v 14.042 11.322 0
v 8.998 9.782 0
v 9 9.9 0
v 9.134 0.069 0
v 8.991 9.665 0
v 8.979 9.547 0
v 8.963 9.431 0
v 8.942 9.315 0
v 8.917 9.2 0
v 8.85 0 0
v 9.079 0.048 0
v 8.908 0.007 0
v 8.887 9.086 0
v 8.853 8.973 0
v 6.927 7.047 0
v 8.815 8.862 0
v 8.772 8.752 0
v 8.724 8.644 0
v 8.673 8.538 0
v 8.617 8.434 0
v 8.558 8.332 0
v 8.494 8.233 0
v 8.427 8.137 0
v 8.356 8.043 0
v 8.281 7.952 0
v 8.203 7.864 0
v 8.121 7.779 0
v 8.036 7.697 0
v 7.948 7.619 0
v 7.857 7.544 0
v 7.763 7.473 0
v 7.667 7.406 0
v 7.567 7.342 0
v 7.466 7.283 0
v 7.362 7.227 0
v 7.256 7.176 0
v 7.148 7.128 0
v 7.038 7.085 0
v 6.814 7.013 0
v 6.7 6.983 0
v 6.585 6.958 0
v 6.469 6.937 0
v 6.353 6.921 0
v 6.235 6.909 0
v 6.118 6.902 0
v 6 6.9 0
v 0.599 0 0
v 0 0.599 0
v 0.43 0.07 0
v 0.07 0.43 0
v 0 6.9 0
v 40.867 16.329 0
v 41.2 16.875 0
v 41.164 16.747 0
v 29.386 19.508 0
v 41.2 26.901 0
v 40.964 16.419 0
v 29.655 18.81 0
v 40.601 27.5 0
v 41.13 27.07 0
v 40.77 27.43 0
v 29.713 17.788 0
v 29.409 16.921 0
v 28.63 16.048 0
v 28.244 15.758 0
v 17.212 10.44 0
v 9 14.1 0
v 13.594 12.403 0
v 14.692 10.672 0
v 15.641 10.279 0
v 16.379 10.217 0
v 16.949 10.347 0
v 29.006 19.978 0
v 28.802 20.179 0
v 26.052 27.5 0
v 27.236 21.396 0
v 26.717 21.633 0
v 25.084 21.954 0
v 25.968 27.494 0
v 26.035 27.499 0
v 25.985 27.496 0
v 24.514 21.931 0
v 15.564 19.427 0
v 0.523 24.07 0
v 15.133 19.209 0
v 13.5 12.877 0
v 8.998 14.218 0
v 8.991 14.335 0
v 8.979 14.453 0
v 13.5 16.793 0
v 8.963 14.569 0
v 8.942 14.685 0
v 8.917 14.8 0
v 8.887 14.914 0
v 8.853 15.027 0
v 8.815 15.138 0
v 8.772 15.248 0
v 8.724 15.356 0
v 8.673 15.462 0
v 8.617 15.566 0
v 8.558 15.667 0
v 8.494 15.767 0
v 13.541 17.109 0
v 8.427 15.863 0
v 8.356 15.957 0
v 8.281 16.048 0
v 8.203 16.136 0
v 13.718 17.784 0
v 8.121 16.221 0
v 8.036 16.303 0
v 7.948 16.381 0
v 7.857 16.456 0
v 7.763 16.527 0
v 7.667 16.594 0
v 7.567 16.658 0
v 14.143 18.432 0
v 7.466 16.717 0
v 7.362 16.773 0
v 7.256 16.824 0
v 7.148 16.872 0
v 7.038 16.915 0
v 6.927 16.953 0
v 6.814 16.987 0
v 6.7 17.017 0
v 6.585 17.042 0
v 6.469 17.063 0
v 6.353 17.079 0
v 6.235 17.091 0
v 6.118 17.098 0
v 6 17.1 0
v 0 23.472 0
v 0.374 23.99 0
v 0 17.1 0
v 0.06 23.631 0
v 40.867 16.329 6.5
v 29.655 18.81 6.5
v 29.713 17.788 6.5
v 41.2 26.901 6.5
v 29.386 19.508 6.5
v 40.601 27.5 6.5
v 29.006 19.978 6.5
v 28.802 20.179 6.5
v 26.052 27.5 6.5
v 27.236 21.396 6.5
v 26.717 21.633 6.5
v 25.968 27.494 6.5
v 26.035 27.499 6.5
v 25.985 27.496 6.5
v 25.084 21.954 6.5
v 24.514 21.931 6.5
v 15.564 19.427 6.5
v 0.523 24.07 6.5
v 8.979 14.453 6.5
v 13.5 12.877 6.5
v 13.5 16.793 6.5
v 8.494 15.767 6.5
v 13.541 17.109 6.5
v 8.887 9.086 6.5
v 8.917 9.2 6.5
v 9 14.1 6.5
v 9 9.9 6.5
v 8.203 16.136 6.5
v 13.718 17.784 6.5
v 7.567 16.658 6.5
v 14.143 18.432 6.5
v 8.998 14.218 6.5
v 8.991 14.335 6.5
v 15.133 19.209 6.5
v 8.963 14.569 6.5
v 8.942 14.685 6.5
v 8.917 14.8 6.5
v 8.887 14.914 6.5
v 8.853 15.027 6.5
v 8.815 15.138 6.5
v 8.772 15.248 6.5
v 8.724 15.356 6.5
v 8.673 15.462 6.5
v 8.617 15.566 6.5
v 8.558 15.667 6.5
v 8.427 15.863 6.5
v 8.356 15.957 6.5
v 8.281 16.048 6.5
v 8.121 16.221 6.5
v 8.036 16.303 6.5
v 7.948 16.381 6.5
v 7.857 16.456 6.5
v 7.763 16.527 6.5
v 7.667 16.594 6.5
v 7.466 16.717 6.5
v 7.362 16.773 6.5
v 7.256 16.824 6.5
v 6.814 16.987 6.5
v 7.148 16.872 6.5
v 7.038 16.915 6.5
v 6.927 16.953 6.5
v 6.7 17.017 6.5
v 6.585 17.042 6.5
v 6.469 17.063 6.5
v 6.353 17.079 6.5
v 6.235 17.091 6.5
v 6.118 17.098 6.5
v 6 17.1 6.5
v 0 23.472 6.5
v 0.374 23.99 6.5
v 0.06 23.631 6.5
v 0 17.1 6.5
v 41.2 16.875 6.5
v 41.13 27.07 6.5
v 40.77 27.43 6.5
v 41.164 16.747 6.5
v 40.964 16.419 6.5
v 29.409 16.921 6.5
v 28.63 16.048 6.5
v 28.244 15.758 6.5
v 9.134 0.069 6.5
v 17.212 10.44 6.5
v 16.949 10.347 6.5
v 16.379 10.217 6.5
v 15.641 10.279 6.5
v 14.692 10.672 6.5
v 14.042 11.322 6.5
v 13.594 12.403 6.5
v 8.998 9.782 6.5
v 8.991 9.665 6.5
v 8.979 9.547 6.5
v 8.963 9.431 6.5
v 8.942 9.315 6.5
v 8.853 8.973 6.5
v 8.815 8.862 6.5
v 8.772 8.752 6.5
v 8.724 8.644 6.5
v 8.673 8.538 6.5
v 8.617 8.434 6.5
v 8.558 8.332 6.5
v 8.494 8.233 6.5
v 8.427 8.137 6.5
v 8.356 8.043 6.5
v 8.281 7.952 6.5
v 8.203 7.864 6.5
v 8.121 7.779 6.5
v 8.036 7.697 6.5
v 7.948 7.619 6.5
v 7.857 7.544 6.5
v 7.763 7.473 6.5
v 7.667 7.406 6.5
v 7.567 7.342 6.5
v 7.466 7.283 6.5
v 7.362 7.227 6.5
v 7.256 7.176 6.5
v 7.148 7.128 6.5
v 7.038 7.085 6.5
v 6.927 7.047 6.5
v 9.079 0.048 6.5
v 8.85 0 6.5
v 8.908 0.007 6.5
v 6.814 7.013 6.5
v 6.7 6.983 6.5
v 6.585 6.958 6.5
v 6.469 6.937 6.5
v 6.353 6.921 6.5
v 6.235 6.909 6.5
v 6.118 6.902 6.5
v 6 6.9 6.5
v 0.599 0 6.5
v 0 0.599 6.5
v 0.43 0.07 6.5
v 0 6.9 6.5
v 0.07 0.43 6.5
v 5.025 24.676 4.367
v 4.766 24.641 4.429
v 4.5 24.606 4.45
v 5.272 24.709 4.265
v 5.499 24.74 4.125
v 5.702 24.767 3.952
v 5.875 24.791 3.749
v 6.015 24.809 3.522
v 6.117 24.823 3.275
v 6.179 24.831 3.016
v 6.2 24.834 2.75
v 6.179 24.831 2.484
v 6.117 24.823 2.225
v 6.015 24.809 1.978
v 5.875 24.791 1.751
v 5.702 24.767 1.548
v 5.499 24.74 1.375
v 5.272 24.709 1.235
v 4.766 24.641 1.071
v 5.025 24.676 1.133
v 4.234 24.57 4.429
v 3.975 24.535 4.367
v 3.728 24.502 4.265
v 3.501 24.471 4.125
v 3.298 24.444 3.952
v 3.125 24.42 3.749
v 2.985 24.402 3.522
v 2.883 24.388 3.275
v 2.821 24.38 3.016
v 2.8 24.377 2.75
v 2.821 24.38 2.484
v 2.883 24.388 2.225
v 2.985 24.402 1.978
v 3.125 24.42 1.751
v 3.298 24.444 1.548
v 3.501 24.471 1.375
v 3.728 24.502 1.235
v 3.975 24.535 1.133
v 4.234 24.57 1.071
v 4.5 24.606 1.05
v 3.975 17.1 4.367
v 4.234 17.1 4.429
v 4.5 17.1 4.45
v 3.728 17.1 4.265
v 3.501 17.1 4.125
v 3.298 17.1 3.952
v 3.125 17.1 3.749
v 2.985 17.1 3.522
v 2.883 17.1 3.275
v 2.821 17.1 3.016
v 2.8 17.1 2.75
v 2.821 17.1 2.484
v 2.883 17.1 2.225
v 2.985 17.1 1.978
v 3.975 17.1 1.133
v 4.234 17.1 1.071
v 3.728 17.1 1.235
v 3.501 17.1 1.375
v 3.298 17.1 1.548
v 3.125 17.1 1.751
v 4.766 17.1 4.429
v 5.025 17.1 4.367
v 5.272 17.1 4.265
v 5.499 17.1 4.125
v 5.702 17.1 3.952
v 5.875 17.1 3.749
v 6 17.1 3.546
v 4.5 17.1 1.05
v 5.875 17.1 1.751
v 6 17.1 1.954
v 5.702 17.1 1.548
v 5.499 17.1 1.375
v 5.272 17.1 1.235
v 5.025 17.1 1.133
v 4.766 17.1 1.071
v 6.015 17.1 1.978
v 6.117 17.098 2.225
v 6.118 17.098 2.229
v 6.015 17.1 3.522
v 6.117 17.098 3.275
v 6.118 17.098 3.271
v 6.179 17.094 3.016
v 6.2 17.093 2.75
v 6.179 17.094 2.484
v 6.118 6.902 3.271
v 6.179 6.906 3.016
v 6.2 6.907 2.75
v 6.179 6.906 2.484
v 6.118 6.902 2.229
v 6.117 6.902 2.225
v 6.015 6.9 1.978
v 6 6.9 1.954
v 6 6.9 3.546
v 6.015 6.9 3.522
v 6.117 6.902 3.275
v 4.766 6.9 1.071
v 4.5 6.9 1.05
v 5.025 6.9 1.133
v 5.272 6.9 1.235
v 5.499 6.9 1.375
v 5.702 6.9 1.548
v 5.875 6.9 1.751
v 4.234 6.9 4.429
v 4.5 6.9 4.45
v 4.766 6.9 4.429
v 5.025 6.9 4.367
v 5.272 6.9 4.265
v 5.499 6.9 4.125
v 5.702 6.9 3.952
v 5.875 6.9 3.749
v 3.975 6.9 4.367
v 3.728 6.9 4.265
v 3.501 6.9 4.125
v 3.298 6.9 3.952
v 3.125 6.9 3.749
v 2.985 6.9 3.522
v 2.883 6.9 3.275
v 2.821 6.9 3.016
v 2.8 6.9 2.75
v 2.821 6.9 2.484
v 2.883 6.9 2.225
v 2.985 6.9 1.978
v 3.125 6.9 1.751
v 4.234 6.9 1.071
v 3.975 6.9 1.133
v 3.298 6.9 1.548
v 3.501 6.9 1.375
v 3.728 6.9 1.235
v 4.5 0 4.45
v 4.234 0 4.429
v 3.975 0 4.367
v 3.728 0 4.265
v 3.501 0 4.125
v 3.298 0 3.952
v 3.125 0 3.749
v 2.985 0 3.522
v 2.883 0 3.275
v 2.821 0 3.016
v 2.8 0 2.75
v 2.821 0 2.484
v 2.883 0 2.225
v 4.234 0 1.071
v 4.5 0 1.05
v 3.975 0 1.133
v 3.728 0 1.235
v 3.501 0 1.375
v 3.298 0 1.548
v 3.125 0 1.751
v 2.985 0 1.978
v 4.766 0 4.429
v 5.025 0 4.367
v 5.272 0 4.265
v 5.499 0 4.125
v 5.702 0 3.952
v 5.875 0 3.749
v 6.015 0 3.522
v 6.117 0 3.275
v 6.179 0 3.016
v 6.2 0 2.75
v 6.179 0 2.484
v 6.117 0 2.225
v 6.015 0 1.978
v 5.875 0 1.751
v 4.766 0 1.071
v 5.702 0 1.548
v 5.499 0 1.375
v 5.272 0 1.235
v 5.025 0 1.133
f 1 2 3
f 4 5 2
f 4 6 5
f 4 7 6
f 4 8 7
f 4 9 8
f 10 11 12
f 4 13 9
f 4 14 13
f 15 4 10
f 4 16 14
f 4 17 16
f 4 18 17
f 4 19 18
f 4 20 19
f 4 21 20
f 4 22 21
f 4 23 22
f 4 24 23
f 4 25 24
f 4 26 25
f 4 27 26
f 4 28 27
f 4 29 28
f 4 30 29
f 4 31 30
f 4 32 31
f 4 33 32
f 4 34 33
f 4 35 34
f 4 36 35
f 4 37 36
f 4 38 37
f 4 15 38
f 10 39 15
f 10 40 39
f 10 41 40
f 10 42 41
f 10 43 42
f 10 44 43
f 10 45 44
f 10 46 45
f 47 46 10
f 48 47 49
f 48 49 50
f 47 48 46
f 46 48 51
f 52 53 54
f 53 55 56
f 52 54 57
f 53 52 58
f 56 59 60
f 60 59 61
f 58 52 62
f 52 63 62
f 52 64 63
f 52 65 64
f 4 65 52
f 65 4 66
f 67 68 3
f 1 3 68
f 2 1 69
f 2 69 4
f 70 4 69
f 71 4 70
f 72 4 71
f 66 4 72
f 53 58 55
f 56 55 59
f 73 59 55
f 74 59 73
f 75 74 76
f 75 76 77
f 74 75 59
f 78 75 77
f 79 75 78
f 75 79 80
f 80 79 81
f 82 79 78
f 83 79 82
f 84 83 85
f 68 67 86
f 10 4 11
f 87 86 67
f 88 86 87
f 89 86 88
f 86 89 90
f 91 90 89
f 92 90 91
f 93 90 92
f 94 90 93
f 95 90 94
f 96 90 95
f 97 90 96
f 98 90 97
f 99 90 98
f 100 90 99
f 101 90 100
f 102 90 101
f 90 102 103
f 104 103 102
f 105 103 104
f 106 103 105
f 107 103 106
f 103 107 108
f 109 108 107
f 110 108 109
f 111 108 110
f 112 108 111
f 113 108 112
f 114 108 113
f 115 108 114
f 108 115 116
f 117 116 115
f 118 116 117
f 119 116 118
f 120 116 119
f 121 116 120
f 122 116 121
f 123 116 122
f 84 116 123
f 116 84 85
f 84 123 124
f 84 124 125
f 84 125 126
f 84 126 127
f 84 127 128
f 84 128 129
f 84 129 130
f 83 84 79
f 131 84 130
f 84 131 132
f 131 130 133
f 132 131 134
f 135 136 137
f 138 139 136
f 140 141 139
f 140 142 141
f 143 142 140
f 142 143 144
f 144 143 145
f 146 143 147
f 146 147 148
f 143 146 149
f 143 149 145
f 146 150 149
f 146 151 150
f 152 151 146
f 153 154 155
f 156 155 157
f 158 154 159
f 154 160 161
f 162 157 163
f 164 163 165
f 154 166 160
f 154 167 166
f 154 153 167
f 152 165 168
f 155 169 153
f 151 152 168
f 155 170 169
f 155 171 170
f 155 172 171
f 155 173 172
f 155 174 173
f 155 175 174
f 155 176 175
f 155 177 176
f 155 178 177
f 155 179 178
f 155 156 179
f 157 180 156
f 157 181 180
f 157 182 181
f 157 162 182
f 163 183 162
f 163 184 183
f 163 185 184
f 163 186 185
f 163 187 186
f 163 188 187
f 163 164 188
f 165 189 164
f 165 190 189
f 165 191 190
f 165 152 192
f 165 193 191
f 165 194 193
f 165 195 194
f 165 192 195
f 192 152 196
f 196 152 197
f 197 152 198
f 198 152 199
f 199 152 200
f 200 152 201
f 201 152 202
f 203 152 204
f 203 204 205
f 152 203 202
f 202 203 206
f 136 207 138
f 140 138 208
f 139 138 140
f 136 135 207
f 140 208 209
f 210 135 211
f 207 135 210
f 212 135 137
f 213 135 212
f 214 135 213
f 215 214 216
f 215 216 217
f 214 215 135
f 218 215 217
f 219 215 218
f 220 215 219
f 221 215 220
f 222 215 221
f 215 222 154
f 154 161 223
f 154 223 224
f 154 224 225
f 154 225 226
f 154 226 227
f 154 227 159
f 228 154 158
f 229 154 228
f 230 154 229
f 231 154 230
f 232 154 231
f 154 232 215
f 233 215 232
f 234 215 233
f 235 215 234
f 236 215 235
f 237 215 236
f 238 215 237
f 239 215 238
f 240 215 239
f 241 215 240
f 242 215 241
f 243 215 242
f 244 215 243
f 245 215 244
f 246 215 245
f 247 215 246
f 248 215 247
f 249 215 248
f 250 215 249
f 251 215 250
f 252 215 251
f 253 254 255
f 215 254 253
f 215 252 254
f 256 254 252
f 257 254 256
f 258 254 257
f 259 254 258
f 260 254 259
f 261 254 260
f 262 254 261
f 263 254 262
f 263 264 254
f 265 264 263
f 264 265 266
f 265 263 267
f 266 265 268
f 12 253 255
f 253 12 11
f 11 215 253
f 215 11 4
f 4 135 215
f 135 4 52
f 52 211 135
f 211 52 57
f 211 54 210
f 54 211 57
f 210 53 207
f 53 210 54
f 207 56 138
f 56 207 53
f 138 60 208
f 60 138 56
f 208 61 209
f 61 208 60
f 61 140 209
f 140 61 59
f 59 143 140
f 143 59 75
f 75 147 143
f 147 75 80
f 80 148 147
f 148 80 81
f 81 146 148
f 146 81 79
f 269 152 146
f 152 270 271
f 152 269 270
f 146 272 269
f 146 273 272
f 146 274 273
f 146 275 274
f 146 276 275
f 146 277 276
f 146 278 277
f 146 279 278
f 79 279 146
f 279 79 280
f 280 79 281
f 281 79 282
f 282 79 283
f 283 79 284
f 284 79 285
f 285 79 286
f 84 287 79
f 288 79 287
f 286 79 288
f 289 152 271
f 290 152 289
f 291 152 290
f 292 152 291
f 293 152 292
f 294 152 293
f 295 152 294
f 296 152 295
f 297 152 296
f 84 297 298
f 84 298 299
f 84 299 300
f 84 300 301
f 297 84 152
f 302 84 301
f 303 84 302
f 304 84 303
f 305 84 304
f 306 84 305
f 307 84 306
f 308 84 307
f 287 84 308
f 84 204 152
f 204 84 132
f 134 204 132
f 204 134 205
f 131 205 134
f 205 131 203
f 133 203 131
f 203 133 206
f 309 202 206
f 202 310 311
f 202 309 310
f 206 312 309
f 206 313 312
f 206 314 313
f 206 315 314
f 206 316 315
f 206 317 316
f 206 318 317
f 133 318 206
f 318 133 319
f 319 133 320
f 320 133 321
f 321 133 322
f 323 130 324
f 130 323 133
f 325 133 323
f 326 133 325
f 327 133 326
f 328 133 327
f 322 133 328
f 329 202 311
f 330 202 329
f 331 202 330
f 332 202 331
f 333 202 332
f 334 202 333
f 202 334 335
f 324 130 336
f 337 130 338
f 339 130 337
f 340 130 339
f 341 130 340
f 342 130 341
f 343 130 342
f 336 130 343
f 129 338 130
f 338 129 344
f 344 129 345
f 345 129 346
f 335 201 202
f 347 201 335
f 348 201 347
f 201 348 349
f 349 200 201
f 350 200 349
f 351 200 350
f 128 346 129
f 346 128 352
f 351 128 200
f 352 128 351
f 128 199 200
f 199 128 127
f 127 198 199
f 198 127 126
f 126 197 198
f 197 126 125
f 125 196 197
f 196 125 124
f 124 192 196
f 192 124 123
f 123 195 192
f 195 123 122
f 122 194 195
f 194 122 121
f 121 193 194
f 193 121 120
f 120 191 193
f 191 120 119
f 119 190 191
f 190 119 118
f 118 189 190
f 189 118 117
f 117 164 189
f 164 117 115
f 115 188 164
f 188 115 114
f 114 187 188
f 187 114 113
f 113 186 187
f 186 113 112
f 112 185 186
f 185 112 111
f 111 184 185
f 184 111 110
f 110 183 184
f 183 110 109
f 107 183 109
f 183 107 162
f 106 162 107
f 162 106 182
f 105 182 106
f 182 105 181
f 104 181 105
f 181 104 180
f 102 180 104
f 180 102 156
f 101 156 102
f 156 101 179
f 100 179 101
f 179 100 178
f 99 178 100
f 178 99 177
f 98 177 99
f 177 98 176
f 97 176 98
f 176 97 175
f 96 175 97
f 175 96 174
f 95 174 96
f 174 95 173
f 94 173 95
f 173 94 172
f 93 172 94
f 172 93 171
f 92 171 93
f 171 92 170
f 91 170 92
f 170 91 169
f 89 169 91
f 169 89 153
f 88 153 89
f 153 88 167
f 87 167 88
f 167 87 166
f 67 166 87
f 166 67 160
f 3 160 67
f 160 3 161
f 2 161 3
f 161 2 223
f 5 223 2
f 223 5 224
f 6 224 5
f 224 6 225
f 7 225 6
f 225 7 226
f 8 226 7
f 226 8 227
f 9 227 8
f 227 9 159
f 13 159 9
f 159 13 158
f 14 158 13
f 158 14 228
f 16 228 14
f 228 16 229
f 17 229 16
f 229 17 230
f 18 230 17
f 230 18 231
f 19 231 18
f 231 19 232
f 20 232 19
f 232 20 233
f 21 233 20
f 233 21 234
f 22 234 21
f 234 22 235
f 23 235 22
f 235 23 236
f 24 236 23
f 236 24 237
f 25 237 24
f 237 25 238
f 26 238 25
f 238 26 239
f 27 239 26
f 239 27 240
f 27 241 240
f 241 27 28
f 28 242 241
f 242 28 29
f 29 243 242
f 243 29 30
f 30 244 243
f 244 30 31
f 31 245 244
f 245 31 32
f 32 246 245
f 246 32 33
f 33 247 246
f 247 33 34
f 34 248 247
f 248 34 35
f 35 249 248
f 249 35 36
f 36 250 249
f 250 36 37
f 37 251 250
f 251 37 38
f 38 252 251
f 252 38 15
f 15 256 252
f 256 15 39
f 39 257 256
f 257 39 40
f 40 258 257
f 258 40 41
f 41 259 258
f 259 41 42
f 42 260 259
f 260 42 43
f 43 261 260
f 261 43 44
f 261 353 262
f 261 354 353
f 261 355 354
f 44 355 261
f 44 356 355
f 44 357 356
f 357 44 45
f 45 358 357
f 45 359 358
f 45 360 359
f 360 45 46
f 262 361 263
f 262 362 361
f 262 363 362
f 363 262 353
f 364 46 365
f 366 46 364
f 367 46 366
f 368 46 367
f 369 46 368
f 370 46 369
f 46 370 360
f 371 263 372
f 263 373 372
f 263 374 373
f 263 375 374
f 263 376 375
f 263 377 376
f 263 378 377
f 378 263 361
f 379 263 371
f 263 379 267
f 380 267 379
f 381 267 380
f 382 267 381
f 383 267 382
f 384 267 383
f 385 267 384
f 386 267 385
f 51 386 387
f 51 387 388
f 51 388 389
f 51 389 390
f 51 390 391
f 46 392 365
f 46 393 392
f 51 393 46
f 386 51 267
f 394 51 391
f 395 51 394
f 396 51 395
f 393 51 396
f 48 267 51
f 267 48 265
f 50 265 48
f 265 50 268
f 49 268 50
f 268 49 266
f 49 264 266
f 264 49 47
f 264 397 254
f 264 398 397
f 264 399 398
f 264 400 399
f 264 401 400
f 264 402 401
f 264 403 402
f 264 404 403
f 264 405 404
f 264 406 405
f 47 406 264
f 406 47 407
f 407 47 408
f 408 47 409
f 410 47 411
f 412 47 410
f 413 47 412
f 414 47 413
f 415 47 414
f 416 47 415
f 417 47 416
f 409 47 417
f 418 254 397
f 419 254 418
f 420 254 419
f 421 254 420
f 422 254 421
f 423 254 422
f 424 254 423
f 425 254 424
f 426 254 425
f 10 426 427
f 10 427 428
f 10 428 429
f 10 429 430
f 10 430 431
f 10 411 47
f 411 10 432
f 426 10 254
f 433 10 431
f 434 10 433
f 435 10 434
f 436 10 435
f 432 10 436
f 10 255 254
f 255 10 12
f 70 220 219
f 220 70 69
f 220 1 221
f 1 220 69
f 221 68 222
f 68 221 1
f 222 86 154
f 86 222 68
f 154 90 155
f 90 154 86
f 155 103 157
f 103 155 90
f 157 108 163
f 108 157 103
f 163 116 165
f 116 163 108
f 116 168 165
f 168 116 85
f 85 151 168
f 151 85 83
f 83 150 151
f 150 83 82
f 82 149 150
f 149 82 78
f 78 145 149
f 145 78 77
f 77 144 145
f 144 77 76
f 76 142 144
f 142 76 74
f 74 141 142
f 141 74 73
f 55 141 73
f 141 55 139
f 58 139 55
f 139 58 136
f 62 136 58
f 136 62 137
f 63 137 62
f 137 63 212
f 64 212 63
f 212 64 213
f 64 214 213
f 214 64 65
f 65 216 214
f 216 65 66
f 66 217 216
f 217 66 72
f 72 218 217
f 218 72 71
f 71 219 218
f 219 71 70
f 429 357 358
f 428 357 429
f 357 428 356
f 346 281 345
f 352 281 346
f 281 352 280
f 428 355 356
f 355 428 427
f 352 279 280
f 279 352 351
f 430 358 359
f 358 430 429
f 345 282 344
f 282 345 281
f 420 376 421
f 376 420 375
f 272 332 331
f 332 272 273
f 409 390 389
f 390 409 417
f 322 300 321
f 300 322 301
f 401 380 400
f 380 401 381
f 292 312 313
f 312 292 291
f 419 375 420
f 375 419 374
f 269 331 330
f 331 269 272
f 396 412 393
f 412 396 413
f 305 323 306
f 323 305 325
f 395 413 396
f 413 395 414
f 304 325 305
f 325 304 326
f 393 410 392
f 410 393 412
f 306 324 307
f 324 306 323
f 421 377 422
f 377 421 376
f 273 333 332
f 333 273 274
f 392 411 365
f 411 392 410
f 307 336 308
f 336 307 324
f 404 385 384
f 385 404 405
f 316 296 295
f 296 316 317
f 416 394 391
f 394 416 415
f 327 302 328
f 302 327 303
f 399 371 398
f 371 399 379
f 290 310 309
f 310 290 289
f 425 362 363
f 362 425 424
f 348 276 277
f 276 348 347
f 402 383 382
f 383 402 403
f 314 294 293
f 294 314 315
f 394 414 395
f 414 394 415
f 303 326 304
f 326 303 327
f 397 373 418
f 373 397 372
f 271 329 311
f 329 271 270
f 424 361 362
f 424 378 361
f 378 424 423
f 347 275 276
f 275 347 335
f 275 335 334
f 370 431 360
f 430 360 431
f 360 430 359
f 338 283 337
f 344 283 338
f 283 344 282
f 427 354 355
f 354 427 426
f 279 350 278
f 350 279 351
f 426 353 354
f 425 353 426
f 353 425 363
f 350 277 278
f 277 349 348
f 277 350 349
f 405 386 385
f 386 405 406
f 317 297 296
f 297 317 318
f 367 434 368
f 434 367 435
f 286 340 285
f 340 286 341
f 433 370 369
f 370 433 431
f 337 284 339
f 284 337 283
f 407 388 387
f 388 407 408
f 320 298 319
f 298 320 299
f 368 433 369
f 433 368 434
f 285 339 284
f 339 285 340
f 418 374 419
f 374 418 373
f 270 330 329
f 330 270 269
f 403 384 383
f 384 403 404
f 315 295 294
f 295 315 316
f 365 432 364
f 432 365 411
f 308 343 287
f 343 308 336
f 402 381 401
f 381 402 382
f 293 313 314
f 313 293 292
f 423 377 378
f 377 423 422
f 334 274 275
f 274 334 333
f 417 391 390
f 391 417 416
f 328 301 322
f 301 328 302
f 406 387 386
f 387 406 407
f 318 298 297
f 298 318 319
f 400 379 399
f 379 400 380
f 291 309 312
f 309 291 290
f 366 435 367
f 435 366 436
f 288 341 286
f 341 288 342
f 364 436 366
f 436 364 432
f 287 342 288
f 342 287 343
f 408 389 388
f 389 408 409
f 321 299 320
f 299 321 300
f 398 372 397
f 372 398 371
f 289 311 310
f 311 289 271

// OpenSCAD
include <../colors.scad>
include <../steering_params.scad>

use <../lib/debug.scad>
use <../lib/functions.scad>
use <../lib/shapes2d.scad>
use <../lib/transforms.scad>

module upper_arm(color=cobalt_blue_metallic) {
  cut_h = upper_arm_h - upper_arm_pin_mount_h * 2;
  cut_y_offset = upper_arm_h / 2 - cut_h / 2;

  module upper_arm_hole() {

    polygon([[0, 0],
             [0, cut_h],
             [upper_arm_length
              - upper_arm_joint_mount_len
              - upper_arm_pin_mount_w
              - upper_arm_side_w,
              cut_h + upper_arm_joint_mount_top_offset],
             [upper_arm_length
              - upper_arm_joint_mount_len
              - upper_arm_pin_mount_w,
              cut_h],
             [upper_arm_length
              - upper_arm_joint_mount_len
              - upper_arm_pin_mount_w,
              cut_h - 2]]);
  }

  module base_shape() {
    polygon([[0, 0],
             [0, upper_arm_h],
             [upper_arm_length - upper_arm_joint_mount_len,
              upper_arm_h + upper_arm_joint_mount_top_offset],
             [upper_arm_length, upper_arm_h + upper_arm_joint_mount_top_offset],
             [upper_arm_length, upper_arm_h - upper_arm_joint_mount_h],
             [upper_arm_pin_mount_w, 0]]);
  }

  module _main() {
    difference() {
      offset_vertices_2d(r=upper_arm_corner_rad, $fn=24) {
        base_shape();
      }

      translate([upper_arm_pin_mount_w
                 + upper_arm_side_w,
                 cut_y_offset
                 + upper_arm_joint_mount_top_offset / 2,
                 0]) {
        offset_vertices_2d(r=upper_arm_hole_corner_r) {
          upper_arm_hole();
        }
      }

      translate([-1, cut_y_offset, 0]) {
        rounded_rect(size=[upper_arm_pin_mount_w + 1,
                           cut_h],
                     fn=$preview ? 20 : 40,
                     side="right",
                     center=false);
      }
    }
  }

  render() {
    difference() {
      maybe_color(color) {
        linear_extrude(height=upper_arm_thickness, center=false) {
          _main();
        }
      }
      translate([upper_arm_pin_mount_w / 2, 0, -0.5 + upper_arm_thickness / 2]) {
        rotate([-90, 0, 0]) {
          cylinder(d=upper_arm_pin_d, h=upper_arm_h + 1, $fn=40);
        }
      }
    }
  }
}

upper_arm();
